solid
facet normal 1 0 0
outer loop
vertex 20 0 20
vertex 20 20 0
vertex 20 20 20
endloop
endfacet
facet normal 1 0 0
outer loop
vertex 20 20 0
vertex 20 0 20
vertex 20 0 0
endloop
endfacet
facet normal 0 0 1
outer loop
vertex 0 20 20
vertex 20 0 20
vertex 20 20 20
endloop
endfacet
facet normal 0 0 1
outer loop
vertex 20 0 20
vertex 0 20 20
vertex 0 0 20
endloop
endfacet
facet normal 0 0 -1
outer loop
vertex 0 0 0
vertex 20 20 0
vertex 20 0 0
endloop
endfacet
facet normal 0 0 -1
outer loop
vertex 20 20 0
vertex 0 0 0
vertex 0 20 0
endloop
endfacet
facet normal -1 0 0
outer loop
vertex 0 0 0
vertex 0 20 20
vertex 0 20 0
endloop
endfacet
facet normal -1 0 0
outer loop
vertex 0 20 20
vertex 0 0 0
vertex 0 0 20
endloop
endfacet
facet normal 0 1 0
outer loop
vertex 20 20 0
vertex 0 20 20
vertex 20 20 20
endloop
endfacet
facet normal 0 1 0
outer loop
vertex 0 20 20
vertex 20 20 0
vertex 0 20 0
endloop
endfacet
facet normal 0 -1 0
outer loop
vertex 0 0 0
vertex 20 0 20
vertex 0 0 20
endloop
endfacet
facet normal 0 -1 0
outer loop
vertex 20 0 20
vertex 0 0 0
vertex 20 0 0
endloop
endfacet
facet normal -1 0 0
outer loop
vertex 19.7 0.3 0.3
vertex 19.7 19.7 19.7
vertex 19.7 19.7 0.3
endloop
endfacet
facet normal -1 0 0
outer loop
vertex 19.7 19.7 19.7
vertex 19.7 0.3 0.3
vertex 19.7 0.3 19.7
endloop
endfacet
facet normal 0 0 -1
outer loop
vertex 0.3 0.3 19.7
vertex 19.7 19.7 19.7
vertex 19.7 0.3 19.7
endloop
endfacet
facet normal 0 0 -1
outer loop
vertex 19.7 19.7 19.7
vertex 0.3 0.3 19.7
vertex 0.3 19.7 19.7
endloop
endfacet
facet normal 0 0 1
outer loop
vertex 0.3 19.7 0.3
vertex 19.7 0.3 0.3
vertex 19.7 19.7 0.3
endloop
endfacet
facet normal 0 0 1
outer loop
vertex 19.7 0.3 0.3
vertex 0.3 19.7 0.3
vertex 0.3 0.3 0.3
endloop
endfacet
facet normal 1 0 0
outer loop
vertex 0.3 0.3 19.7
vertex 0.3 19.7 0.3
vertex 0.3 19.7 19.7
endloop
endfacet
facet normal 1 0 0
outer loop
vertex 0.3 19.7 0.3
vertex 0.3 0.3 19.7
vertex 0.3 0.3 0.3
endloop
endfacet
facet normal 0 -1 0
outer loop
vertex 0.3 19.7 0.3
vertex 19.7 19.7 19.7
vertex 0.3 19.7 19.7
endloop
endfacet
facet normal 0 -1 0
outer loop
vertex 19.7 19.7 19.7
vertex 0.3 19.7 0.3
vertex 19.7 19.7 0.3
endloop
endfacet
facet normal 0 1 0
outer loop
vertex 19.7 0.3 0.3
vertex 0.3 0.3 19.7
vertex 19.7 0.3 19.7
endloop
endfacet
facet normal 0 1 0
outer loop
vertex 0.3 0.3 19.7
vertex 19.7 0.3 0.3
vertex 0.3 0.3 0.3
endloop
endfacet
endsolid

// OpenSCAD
// A uniform 0.3mm shell -- well under the 0.8mm default minimum
// (2x the 0.4mm default nozzle diameter).
$fa = 6; $fs = 0.5;
difference() {
    cube([20, 20, 20]);
    translate([0.3, 0.3, 0.3]) cube([19.4, 19.4, 19.4]);
}
